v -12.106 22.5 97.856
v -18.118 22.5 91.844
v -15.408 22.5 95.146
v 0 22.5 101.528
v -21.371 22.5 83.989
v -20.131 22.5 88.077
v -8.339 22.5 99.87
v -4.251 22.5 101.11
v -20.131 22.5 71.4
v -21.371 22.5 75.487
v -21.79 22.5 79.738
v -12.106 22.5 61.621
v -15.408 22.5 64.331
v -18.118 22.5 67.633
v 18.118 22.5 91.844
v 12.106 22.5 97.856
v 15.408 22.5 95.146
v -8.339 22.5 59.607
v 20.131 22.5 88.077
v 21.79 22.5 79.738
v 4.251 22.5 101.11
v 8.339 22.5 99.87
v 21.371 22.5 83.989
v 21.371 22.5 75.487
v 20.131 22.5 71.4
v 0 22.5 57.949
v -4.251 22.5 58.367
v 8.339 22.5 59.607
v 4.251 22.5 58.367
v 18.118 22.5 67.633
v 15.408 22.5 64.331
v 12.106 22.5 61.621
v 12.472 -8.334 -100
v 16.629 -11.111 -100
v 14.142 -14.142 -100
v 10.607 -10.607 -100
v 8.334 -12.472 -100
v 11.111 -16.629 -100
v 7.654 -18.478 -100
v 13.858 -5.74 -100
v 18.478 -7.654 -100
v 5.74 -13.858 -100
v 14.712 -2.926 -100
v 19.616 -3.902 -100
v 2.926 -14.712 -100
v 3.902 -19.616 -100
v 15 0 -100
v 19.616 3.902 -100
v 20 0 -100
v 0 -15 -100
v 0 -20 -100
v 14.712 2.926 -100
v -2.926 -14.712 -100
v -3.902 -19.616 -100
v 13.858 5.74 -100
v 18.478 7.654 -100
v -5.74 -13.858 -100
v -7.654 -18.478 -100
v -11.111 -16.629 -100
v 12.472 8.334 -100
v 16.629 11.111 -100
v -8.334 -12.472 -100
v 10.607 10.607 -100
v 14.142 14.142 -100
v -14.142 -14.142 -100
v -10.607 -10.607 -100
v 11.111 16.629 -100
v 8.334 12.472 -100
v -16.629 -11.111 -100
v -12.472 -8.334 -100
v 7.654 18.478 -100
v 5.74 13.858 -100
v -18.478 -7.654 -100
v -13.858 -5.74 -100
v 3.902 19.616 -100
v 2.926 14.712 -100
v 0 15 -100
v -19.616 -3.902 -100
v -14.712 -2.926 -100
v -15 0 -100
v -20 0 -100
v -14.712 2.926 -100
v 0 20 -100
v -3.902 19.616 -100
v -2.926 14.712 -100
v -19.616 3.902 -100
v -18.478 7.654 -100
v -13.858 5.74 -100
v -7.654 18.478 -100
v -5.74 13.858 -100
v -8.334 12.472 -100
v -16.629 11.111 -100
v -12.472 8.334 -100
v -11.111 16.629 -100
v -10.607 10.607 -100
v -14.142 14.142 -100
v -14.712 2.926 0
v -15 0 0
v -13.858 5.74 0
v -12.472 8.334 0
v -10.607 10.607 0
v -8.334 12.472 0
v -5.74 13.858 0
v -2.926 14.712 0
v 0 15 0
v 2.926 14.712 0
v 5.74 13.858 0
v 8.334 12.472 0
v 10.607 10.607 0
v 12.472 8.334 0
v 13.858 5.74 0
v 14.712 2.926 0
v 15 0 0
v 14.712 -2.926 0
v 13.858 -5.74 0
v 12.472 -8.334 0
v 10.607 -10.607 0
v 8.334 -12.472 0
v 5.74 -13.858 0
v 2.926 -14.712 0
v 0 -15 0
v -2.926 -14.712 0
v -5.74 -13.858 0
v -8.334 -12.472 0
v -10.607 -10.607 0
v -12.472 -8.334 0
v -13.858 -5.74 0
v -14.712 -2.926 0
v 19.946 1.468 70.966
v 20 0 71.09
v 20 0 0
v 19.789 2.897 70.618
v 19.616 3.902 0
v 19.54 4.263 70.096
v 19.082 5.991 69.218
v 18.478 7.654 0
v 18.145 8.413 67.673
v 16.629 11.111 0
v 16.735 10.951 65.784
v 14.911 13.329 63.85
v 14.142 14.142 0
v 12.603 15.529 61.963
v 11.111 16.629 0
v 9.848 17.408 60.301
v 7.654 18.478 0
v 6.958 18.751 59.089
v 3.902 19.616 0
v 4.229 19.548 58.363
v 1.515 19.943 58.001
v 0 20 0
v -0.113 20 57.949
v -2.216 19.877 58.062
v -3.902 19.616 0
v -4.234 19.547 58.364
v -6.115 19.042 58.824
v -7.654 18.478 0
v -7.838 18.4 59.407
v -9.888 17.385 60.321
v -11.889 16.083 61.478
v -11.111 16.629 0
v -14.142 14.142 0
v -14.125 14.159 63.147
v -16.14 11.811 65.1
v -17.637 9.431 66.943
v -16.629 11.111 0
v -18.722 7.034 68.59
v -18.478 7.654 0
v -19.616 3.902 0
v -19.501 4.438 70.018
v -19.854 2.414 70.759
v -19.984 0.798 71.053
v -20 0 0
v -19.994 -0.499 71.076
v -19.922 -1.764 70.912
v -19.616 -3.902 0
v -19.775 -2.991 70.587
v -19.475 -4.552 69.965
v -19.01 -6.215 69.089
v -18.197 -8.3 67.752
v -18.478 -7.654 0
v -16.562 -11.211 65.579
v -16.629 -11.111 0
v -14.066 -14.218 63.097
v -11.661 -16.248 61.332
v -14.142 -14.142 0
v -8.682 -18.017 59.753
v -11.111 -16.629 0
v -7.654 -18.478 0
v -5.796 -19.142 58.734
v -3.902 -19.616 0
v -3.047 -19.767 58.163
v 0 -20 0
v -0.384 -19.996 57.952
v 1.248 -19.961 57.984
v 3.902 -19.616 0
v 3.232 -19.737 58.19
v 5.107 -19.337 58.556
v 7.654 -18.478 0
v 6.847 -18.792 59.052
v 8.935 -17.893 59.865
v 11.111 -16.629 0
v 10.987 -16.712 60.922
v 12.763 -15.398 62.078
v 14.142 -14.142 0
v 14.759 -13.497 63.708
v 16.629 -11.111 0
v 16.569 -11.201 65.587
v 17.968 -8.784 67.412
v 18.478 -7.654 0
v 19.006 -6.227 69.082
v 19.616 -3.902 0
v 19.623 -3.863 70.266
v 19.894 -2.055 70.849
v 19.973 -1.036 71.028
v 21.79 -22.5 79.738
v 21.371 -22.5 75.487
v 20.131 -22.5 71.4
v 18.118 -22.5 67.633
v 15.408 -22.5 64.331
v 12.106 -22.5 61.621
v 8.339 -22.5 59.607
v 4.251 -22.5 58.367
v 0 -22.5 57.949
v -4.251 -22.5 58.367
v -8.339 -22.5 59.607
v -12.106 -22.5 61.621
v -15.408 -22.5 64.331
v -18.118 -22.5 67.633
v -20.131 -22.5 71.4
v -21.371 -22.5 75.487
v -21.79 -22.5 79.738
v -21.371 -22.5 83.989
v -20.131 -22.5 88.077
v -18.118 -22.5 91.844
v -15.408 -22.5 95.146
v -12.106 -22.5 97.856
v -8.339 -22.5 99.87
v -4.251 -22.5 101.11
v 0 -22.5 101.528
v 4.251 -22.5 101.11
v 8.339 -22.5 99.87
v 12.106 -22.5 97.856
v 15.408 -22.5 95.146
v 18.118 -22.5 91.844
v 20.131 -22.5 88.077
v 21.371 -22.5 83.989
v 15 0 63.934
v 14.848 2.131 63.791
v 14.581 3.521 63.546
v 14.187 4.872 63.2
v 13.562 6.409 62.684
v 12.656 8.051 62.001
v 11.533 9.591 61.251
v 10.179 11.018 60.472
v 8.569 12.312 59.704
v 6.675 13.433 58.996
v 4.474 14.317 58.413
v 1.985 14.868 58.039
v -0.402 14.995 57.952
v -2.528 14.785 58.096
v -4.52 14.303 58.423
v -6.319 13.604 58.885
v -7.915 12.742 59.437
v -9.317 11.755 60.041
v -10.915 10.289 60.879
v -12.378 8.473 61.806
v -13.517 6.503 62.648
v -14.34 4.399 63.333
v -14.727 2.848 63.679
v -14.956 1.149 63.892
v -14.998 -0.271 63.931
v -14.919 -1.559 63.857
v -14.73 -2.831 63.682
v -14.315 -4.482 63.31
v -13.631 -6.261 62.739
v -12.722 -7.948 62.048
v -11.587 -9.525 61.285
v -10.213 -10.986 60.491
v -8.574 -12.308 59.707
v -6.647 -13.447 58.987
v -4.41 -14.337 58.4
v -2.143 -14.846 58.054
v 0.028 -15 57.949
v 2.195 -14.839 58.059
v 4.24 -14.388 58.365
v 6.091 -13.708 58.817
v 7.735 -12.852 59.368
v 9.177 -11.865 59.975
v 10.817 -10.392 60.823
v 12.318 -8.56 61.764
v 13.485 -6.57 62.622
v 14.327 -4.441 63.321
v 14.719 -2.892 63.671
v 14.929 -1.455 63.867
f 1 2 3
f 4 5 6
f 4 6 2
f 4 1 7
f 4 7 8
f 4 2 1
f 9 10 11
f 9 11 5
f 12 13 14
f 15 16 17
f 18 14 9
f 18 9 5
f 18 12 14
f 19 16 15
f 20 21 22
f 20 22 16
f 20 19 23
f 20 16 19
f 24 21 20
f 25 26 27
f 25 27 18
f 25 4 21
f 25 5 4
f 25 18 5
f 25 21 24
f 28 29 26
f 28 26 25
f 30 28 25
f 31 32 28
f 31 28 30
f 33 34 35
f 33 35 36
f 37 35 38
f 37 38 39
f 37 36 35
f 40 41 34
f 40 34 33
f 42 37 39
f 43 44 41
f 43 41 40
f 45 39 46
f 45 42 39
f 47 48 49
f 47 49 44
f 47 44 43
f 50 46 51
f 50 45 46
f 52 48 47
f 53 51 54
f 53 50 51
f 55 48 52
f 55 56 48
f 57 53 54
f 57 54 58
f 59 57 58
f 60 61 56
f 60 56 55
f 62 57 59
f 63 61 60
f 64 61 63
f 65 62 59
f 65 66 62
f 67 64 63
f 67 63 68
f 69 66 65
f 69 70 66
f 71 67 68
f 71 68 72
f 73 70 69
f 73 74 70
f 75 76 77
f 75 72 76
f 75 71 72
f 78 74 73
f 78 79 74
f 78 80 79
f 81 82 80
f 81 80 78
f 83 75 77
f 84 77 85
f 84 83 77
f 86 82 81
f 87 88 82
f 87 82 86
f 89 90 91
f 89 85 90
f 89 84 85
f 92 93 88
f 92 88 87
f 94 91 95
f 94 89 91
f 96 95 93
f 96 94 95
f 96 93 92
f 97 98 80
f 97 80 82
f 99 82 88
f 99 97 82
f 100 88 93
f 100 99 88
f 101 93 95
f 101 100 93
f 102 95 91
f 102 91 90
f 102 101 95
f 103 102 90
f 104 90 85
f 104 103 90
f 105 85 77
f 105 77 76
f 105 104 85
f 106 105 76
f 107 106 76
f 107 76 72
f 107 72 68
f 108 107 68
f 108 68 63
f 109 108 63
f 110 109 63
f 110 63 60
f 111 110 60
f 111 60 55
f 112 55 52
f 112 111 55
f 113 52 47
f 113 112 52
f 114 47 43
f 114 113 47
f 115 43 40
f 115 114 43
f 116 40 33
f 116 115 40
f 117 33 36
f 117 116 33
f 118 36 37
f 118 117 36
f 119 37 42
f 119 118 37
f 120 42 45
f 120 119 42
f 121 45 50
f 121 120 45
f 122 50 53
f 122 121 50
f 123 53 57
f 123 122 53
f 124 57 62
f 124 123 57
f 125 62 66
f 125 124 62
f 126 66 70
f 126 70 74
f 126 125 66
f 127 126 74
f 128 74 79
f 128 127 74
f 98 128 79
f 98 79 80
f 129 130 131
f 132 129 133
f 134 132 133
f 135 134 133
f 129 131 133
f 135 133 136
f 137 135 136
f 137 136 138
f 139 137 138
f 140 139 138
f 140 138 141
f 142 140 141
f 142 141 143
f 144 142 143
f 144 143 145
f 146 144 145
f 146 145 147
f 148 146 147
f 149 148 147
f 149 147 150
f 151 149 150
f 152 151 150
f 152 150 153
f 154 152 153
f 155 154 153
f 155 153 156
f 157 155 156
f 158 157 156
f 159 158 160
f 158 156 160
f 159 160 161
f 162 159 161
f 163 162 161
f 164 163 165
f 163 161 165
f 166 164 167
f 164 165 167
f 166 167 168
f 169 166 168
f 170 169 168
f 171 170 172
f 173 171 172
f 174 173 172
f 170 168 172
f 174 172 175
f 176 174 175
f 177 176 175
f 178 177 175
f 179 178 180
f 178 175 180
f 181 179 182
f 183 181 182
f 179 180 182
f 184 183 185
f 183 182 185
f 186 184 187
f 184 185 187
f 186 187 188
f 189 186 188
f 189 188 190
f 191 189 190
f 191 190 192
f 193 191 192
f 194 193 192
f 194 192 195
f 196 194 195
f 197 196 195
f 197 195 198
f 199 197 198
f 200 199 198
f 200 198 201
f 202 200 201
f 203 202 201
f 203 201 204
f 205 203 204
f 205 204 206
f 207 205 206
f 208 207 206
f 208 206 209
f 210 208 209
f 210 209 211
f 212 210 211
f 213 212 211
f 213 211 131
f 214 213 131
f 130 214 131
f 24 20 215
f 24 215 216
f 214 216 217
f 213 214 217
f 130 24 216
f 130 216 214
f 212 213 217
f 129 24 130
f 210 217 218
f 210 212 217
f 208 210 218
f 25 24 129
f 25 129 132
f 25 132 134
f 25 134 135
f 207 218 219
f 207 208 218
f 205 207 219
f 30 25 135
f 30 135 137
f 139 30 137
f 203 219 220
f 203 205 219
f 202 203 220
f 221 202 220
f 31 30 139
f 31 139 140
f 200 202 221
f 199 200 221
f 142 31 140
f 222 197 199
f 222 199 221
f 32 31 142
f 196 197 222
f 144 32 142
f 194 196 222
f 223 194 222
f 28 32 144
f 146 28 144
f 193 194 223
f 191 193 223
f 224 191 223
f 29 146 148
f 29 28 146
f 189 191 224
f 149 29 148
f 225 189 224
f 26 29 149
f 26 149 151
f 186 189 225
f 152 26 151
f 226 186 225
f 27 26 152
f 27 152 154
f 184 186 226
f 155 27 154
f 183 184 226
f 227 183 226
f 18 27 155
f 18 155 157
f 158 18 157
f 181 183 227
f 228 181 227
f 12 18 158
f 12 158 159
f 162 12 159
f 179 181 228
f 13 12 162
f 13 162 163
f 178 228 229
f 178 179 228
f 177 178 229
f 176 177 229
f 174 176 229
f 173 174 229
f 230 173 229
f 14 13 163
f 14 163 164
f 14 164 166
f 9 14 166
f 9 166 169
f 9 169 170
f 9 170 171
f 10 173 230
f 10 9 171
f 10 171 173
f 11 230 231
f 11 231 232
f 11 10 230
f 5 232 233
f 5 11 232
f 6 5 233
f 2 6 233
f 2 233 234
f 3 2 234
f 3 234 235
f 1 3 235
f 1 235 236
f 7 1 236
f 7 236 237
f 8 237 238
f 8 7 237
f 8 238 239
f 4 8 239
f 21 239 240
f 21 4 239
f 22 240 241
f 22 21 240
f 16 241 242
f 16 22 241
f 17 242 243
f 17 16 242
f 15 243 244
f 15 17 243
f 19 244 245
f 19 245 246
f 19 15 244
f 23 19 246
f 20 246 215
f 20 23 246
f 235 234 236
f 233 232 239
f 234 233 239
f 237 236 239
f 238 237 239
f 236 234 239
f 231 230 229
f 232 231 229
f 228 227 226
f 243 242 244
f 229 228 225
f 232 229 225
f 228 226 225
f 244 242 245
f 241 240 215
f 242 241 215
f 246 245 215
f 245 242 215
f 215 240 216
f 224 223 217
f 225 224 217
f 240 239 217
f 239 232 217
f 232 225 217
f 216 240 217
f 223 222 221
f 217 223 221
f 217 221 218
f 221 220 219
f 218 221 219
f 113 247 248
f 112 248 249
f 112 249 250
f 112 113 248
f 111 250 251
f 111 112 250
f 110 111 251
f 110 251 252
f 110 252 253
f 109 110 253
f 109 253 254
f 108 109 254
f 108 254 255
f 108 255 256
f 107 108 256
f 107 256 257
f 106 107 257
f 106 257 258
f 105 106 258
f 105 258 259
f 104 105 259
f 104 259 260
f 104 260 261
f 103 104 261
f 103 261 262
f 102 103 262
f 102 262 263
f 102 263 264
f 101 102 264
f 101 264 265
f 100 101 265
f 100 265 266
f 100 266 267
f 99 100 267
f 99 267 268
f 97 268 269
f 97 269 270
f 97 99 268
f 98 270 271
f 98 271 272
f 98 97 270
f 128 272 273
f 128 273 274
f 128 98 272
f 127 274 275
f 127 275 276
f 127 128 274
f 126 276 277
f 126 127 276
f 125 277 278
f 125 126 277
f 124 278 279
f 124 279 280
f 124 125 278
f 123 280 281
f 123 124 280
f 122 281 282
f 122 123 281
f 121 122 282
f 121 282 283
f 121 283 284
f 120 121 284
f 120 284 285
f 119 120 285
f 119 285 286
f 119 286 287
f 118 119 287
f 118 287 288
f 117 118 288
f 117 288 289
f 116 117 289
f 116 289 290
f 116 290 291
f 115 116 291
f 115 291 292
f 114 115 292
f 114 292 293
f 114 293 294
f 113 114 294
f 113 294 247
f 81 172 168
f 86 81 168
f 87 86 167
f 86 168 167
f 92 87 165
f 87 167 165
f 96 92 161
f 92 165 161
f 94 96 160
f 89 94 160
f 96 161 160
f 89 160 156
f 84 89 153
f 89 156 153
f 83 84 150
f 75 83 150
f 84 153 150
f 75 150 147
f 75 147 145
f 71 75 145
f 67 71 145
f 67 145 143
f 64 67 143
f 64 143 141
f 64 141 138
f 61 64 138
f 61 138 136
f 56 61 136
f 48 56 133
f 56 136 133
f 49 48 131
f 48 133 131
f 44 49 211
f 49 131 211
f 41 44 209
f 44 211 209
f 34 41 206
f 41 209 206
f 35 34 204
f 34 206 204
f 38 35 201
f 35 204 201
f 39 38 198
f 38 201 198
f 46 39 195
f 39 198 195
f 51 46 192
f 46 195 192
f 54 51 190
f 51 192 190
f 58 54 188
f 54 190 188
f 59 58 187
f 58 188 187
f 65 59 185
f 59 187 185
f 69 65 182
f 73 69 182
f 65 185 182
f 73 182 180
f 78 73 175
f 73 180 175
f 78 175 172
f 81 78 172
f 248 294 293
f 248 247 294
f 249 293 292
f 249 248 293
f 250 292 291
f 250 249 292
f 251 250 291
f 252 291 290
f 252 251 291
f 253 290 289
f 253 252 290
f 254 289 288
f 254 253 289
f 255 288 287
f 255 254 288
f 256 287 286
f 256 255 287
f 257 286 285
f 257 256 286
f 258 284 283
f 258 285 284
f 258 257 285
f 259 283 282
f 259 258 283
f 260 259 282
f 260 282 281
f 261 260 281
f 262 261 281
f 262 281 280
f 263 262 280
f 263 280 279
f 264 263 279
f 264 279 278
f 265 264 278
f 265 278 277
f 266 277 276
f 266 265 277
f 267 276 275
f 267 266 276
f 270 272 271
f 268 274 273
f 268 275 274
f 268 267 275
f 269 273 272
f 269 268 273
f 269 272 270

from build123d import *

# Parameters (mm, degrees)
SKETCH1_R           = 20
SKETCH1_R_2         = 15
BOSS_EXTRUDE1_DEPTH = 80
SKETCH7_R           = 20
SKETCH7_R_2         = 15
BOSS_EXTRUDE4_DEPTH = 100
SKETCH8_R           = 21.789778514
BOSS_EXTRUDE5_DEPTH = 22.5


with BuildPart() as part:
    # Sketch1 → Boss-Extrude1 (new body)
    with BuildSketch(Plane.XY):
        Circle(SKETCH1_R)
        Circle(SKETCH1_R_2, mode=Mode.SUBTRACT)
    extrude(amount=BOSS_EXTRUDE1_DEPTH)

    # Sketch7 → Boss-Extrude4 (add)
    with BuildSketch(Plane(origin=(0, 0, 0), x_dir=(-1, 0, 0), z_dir=(0, 0, -1))):
        Circle(SKETCH7_R)
        Circle(SKETCH7_R_2, mode=Mode.SUBTRACT)
    extrude(amount=BOSS_EXTRUDE4_DEPTH)

    # Sketch8 → Boss-Extrude5 (add, symmetric)
    with BuildSketch(Plane(origin=(0, 0, 0), x_dir=(1, 0, 0), z_dir=(0, 1, 0))):
        with Locations((0, -79.738438167)):
            Circle(SKETCH8_R)
    extrude(amount=BOSS_EXTRUDE5_DEPTH, both=True)


solid = part.part
